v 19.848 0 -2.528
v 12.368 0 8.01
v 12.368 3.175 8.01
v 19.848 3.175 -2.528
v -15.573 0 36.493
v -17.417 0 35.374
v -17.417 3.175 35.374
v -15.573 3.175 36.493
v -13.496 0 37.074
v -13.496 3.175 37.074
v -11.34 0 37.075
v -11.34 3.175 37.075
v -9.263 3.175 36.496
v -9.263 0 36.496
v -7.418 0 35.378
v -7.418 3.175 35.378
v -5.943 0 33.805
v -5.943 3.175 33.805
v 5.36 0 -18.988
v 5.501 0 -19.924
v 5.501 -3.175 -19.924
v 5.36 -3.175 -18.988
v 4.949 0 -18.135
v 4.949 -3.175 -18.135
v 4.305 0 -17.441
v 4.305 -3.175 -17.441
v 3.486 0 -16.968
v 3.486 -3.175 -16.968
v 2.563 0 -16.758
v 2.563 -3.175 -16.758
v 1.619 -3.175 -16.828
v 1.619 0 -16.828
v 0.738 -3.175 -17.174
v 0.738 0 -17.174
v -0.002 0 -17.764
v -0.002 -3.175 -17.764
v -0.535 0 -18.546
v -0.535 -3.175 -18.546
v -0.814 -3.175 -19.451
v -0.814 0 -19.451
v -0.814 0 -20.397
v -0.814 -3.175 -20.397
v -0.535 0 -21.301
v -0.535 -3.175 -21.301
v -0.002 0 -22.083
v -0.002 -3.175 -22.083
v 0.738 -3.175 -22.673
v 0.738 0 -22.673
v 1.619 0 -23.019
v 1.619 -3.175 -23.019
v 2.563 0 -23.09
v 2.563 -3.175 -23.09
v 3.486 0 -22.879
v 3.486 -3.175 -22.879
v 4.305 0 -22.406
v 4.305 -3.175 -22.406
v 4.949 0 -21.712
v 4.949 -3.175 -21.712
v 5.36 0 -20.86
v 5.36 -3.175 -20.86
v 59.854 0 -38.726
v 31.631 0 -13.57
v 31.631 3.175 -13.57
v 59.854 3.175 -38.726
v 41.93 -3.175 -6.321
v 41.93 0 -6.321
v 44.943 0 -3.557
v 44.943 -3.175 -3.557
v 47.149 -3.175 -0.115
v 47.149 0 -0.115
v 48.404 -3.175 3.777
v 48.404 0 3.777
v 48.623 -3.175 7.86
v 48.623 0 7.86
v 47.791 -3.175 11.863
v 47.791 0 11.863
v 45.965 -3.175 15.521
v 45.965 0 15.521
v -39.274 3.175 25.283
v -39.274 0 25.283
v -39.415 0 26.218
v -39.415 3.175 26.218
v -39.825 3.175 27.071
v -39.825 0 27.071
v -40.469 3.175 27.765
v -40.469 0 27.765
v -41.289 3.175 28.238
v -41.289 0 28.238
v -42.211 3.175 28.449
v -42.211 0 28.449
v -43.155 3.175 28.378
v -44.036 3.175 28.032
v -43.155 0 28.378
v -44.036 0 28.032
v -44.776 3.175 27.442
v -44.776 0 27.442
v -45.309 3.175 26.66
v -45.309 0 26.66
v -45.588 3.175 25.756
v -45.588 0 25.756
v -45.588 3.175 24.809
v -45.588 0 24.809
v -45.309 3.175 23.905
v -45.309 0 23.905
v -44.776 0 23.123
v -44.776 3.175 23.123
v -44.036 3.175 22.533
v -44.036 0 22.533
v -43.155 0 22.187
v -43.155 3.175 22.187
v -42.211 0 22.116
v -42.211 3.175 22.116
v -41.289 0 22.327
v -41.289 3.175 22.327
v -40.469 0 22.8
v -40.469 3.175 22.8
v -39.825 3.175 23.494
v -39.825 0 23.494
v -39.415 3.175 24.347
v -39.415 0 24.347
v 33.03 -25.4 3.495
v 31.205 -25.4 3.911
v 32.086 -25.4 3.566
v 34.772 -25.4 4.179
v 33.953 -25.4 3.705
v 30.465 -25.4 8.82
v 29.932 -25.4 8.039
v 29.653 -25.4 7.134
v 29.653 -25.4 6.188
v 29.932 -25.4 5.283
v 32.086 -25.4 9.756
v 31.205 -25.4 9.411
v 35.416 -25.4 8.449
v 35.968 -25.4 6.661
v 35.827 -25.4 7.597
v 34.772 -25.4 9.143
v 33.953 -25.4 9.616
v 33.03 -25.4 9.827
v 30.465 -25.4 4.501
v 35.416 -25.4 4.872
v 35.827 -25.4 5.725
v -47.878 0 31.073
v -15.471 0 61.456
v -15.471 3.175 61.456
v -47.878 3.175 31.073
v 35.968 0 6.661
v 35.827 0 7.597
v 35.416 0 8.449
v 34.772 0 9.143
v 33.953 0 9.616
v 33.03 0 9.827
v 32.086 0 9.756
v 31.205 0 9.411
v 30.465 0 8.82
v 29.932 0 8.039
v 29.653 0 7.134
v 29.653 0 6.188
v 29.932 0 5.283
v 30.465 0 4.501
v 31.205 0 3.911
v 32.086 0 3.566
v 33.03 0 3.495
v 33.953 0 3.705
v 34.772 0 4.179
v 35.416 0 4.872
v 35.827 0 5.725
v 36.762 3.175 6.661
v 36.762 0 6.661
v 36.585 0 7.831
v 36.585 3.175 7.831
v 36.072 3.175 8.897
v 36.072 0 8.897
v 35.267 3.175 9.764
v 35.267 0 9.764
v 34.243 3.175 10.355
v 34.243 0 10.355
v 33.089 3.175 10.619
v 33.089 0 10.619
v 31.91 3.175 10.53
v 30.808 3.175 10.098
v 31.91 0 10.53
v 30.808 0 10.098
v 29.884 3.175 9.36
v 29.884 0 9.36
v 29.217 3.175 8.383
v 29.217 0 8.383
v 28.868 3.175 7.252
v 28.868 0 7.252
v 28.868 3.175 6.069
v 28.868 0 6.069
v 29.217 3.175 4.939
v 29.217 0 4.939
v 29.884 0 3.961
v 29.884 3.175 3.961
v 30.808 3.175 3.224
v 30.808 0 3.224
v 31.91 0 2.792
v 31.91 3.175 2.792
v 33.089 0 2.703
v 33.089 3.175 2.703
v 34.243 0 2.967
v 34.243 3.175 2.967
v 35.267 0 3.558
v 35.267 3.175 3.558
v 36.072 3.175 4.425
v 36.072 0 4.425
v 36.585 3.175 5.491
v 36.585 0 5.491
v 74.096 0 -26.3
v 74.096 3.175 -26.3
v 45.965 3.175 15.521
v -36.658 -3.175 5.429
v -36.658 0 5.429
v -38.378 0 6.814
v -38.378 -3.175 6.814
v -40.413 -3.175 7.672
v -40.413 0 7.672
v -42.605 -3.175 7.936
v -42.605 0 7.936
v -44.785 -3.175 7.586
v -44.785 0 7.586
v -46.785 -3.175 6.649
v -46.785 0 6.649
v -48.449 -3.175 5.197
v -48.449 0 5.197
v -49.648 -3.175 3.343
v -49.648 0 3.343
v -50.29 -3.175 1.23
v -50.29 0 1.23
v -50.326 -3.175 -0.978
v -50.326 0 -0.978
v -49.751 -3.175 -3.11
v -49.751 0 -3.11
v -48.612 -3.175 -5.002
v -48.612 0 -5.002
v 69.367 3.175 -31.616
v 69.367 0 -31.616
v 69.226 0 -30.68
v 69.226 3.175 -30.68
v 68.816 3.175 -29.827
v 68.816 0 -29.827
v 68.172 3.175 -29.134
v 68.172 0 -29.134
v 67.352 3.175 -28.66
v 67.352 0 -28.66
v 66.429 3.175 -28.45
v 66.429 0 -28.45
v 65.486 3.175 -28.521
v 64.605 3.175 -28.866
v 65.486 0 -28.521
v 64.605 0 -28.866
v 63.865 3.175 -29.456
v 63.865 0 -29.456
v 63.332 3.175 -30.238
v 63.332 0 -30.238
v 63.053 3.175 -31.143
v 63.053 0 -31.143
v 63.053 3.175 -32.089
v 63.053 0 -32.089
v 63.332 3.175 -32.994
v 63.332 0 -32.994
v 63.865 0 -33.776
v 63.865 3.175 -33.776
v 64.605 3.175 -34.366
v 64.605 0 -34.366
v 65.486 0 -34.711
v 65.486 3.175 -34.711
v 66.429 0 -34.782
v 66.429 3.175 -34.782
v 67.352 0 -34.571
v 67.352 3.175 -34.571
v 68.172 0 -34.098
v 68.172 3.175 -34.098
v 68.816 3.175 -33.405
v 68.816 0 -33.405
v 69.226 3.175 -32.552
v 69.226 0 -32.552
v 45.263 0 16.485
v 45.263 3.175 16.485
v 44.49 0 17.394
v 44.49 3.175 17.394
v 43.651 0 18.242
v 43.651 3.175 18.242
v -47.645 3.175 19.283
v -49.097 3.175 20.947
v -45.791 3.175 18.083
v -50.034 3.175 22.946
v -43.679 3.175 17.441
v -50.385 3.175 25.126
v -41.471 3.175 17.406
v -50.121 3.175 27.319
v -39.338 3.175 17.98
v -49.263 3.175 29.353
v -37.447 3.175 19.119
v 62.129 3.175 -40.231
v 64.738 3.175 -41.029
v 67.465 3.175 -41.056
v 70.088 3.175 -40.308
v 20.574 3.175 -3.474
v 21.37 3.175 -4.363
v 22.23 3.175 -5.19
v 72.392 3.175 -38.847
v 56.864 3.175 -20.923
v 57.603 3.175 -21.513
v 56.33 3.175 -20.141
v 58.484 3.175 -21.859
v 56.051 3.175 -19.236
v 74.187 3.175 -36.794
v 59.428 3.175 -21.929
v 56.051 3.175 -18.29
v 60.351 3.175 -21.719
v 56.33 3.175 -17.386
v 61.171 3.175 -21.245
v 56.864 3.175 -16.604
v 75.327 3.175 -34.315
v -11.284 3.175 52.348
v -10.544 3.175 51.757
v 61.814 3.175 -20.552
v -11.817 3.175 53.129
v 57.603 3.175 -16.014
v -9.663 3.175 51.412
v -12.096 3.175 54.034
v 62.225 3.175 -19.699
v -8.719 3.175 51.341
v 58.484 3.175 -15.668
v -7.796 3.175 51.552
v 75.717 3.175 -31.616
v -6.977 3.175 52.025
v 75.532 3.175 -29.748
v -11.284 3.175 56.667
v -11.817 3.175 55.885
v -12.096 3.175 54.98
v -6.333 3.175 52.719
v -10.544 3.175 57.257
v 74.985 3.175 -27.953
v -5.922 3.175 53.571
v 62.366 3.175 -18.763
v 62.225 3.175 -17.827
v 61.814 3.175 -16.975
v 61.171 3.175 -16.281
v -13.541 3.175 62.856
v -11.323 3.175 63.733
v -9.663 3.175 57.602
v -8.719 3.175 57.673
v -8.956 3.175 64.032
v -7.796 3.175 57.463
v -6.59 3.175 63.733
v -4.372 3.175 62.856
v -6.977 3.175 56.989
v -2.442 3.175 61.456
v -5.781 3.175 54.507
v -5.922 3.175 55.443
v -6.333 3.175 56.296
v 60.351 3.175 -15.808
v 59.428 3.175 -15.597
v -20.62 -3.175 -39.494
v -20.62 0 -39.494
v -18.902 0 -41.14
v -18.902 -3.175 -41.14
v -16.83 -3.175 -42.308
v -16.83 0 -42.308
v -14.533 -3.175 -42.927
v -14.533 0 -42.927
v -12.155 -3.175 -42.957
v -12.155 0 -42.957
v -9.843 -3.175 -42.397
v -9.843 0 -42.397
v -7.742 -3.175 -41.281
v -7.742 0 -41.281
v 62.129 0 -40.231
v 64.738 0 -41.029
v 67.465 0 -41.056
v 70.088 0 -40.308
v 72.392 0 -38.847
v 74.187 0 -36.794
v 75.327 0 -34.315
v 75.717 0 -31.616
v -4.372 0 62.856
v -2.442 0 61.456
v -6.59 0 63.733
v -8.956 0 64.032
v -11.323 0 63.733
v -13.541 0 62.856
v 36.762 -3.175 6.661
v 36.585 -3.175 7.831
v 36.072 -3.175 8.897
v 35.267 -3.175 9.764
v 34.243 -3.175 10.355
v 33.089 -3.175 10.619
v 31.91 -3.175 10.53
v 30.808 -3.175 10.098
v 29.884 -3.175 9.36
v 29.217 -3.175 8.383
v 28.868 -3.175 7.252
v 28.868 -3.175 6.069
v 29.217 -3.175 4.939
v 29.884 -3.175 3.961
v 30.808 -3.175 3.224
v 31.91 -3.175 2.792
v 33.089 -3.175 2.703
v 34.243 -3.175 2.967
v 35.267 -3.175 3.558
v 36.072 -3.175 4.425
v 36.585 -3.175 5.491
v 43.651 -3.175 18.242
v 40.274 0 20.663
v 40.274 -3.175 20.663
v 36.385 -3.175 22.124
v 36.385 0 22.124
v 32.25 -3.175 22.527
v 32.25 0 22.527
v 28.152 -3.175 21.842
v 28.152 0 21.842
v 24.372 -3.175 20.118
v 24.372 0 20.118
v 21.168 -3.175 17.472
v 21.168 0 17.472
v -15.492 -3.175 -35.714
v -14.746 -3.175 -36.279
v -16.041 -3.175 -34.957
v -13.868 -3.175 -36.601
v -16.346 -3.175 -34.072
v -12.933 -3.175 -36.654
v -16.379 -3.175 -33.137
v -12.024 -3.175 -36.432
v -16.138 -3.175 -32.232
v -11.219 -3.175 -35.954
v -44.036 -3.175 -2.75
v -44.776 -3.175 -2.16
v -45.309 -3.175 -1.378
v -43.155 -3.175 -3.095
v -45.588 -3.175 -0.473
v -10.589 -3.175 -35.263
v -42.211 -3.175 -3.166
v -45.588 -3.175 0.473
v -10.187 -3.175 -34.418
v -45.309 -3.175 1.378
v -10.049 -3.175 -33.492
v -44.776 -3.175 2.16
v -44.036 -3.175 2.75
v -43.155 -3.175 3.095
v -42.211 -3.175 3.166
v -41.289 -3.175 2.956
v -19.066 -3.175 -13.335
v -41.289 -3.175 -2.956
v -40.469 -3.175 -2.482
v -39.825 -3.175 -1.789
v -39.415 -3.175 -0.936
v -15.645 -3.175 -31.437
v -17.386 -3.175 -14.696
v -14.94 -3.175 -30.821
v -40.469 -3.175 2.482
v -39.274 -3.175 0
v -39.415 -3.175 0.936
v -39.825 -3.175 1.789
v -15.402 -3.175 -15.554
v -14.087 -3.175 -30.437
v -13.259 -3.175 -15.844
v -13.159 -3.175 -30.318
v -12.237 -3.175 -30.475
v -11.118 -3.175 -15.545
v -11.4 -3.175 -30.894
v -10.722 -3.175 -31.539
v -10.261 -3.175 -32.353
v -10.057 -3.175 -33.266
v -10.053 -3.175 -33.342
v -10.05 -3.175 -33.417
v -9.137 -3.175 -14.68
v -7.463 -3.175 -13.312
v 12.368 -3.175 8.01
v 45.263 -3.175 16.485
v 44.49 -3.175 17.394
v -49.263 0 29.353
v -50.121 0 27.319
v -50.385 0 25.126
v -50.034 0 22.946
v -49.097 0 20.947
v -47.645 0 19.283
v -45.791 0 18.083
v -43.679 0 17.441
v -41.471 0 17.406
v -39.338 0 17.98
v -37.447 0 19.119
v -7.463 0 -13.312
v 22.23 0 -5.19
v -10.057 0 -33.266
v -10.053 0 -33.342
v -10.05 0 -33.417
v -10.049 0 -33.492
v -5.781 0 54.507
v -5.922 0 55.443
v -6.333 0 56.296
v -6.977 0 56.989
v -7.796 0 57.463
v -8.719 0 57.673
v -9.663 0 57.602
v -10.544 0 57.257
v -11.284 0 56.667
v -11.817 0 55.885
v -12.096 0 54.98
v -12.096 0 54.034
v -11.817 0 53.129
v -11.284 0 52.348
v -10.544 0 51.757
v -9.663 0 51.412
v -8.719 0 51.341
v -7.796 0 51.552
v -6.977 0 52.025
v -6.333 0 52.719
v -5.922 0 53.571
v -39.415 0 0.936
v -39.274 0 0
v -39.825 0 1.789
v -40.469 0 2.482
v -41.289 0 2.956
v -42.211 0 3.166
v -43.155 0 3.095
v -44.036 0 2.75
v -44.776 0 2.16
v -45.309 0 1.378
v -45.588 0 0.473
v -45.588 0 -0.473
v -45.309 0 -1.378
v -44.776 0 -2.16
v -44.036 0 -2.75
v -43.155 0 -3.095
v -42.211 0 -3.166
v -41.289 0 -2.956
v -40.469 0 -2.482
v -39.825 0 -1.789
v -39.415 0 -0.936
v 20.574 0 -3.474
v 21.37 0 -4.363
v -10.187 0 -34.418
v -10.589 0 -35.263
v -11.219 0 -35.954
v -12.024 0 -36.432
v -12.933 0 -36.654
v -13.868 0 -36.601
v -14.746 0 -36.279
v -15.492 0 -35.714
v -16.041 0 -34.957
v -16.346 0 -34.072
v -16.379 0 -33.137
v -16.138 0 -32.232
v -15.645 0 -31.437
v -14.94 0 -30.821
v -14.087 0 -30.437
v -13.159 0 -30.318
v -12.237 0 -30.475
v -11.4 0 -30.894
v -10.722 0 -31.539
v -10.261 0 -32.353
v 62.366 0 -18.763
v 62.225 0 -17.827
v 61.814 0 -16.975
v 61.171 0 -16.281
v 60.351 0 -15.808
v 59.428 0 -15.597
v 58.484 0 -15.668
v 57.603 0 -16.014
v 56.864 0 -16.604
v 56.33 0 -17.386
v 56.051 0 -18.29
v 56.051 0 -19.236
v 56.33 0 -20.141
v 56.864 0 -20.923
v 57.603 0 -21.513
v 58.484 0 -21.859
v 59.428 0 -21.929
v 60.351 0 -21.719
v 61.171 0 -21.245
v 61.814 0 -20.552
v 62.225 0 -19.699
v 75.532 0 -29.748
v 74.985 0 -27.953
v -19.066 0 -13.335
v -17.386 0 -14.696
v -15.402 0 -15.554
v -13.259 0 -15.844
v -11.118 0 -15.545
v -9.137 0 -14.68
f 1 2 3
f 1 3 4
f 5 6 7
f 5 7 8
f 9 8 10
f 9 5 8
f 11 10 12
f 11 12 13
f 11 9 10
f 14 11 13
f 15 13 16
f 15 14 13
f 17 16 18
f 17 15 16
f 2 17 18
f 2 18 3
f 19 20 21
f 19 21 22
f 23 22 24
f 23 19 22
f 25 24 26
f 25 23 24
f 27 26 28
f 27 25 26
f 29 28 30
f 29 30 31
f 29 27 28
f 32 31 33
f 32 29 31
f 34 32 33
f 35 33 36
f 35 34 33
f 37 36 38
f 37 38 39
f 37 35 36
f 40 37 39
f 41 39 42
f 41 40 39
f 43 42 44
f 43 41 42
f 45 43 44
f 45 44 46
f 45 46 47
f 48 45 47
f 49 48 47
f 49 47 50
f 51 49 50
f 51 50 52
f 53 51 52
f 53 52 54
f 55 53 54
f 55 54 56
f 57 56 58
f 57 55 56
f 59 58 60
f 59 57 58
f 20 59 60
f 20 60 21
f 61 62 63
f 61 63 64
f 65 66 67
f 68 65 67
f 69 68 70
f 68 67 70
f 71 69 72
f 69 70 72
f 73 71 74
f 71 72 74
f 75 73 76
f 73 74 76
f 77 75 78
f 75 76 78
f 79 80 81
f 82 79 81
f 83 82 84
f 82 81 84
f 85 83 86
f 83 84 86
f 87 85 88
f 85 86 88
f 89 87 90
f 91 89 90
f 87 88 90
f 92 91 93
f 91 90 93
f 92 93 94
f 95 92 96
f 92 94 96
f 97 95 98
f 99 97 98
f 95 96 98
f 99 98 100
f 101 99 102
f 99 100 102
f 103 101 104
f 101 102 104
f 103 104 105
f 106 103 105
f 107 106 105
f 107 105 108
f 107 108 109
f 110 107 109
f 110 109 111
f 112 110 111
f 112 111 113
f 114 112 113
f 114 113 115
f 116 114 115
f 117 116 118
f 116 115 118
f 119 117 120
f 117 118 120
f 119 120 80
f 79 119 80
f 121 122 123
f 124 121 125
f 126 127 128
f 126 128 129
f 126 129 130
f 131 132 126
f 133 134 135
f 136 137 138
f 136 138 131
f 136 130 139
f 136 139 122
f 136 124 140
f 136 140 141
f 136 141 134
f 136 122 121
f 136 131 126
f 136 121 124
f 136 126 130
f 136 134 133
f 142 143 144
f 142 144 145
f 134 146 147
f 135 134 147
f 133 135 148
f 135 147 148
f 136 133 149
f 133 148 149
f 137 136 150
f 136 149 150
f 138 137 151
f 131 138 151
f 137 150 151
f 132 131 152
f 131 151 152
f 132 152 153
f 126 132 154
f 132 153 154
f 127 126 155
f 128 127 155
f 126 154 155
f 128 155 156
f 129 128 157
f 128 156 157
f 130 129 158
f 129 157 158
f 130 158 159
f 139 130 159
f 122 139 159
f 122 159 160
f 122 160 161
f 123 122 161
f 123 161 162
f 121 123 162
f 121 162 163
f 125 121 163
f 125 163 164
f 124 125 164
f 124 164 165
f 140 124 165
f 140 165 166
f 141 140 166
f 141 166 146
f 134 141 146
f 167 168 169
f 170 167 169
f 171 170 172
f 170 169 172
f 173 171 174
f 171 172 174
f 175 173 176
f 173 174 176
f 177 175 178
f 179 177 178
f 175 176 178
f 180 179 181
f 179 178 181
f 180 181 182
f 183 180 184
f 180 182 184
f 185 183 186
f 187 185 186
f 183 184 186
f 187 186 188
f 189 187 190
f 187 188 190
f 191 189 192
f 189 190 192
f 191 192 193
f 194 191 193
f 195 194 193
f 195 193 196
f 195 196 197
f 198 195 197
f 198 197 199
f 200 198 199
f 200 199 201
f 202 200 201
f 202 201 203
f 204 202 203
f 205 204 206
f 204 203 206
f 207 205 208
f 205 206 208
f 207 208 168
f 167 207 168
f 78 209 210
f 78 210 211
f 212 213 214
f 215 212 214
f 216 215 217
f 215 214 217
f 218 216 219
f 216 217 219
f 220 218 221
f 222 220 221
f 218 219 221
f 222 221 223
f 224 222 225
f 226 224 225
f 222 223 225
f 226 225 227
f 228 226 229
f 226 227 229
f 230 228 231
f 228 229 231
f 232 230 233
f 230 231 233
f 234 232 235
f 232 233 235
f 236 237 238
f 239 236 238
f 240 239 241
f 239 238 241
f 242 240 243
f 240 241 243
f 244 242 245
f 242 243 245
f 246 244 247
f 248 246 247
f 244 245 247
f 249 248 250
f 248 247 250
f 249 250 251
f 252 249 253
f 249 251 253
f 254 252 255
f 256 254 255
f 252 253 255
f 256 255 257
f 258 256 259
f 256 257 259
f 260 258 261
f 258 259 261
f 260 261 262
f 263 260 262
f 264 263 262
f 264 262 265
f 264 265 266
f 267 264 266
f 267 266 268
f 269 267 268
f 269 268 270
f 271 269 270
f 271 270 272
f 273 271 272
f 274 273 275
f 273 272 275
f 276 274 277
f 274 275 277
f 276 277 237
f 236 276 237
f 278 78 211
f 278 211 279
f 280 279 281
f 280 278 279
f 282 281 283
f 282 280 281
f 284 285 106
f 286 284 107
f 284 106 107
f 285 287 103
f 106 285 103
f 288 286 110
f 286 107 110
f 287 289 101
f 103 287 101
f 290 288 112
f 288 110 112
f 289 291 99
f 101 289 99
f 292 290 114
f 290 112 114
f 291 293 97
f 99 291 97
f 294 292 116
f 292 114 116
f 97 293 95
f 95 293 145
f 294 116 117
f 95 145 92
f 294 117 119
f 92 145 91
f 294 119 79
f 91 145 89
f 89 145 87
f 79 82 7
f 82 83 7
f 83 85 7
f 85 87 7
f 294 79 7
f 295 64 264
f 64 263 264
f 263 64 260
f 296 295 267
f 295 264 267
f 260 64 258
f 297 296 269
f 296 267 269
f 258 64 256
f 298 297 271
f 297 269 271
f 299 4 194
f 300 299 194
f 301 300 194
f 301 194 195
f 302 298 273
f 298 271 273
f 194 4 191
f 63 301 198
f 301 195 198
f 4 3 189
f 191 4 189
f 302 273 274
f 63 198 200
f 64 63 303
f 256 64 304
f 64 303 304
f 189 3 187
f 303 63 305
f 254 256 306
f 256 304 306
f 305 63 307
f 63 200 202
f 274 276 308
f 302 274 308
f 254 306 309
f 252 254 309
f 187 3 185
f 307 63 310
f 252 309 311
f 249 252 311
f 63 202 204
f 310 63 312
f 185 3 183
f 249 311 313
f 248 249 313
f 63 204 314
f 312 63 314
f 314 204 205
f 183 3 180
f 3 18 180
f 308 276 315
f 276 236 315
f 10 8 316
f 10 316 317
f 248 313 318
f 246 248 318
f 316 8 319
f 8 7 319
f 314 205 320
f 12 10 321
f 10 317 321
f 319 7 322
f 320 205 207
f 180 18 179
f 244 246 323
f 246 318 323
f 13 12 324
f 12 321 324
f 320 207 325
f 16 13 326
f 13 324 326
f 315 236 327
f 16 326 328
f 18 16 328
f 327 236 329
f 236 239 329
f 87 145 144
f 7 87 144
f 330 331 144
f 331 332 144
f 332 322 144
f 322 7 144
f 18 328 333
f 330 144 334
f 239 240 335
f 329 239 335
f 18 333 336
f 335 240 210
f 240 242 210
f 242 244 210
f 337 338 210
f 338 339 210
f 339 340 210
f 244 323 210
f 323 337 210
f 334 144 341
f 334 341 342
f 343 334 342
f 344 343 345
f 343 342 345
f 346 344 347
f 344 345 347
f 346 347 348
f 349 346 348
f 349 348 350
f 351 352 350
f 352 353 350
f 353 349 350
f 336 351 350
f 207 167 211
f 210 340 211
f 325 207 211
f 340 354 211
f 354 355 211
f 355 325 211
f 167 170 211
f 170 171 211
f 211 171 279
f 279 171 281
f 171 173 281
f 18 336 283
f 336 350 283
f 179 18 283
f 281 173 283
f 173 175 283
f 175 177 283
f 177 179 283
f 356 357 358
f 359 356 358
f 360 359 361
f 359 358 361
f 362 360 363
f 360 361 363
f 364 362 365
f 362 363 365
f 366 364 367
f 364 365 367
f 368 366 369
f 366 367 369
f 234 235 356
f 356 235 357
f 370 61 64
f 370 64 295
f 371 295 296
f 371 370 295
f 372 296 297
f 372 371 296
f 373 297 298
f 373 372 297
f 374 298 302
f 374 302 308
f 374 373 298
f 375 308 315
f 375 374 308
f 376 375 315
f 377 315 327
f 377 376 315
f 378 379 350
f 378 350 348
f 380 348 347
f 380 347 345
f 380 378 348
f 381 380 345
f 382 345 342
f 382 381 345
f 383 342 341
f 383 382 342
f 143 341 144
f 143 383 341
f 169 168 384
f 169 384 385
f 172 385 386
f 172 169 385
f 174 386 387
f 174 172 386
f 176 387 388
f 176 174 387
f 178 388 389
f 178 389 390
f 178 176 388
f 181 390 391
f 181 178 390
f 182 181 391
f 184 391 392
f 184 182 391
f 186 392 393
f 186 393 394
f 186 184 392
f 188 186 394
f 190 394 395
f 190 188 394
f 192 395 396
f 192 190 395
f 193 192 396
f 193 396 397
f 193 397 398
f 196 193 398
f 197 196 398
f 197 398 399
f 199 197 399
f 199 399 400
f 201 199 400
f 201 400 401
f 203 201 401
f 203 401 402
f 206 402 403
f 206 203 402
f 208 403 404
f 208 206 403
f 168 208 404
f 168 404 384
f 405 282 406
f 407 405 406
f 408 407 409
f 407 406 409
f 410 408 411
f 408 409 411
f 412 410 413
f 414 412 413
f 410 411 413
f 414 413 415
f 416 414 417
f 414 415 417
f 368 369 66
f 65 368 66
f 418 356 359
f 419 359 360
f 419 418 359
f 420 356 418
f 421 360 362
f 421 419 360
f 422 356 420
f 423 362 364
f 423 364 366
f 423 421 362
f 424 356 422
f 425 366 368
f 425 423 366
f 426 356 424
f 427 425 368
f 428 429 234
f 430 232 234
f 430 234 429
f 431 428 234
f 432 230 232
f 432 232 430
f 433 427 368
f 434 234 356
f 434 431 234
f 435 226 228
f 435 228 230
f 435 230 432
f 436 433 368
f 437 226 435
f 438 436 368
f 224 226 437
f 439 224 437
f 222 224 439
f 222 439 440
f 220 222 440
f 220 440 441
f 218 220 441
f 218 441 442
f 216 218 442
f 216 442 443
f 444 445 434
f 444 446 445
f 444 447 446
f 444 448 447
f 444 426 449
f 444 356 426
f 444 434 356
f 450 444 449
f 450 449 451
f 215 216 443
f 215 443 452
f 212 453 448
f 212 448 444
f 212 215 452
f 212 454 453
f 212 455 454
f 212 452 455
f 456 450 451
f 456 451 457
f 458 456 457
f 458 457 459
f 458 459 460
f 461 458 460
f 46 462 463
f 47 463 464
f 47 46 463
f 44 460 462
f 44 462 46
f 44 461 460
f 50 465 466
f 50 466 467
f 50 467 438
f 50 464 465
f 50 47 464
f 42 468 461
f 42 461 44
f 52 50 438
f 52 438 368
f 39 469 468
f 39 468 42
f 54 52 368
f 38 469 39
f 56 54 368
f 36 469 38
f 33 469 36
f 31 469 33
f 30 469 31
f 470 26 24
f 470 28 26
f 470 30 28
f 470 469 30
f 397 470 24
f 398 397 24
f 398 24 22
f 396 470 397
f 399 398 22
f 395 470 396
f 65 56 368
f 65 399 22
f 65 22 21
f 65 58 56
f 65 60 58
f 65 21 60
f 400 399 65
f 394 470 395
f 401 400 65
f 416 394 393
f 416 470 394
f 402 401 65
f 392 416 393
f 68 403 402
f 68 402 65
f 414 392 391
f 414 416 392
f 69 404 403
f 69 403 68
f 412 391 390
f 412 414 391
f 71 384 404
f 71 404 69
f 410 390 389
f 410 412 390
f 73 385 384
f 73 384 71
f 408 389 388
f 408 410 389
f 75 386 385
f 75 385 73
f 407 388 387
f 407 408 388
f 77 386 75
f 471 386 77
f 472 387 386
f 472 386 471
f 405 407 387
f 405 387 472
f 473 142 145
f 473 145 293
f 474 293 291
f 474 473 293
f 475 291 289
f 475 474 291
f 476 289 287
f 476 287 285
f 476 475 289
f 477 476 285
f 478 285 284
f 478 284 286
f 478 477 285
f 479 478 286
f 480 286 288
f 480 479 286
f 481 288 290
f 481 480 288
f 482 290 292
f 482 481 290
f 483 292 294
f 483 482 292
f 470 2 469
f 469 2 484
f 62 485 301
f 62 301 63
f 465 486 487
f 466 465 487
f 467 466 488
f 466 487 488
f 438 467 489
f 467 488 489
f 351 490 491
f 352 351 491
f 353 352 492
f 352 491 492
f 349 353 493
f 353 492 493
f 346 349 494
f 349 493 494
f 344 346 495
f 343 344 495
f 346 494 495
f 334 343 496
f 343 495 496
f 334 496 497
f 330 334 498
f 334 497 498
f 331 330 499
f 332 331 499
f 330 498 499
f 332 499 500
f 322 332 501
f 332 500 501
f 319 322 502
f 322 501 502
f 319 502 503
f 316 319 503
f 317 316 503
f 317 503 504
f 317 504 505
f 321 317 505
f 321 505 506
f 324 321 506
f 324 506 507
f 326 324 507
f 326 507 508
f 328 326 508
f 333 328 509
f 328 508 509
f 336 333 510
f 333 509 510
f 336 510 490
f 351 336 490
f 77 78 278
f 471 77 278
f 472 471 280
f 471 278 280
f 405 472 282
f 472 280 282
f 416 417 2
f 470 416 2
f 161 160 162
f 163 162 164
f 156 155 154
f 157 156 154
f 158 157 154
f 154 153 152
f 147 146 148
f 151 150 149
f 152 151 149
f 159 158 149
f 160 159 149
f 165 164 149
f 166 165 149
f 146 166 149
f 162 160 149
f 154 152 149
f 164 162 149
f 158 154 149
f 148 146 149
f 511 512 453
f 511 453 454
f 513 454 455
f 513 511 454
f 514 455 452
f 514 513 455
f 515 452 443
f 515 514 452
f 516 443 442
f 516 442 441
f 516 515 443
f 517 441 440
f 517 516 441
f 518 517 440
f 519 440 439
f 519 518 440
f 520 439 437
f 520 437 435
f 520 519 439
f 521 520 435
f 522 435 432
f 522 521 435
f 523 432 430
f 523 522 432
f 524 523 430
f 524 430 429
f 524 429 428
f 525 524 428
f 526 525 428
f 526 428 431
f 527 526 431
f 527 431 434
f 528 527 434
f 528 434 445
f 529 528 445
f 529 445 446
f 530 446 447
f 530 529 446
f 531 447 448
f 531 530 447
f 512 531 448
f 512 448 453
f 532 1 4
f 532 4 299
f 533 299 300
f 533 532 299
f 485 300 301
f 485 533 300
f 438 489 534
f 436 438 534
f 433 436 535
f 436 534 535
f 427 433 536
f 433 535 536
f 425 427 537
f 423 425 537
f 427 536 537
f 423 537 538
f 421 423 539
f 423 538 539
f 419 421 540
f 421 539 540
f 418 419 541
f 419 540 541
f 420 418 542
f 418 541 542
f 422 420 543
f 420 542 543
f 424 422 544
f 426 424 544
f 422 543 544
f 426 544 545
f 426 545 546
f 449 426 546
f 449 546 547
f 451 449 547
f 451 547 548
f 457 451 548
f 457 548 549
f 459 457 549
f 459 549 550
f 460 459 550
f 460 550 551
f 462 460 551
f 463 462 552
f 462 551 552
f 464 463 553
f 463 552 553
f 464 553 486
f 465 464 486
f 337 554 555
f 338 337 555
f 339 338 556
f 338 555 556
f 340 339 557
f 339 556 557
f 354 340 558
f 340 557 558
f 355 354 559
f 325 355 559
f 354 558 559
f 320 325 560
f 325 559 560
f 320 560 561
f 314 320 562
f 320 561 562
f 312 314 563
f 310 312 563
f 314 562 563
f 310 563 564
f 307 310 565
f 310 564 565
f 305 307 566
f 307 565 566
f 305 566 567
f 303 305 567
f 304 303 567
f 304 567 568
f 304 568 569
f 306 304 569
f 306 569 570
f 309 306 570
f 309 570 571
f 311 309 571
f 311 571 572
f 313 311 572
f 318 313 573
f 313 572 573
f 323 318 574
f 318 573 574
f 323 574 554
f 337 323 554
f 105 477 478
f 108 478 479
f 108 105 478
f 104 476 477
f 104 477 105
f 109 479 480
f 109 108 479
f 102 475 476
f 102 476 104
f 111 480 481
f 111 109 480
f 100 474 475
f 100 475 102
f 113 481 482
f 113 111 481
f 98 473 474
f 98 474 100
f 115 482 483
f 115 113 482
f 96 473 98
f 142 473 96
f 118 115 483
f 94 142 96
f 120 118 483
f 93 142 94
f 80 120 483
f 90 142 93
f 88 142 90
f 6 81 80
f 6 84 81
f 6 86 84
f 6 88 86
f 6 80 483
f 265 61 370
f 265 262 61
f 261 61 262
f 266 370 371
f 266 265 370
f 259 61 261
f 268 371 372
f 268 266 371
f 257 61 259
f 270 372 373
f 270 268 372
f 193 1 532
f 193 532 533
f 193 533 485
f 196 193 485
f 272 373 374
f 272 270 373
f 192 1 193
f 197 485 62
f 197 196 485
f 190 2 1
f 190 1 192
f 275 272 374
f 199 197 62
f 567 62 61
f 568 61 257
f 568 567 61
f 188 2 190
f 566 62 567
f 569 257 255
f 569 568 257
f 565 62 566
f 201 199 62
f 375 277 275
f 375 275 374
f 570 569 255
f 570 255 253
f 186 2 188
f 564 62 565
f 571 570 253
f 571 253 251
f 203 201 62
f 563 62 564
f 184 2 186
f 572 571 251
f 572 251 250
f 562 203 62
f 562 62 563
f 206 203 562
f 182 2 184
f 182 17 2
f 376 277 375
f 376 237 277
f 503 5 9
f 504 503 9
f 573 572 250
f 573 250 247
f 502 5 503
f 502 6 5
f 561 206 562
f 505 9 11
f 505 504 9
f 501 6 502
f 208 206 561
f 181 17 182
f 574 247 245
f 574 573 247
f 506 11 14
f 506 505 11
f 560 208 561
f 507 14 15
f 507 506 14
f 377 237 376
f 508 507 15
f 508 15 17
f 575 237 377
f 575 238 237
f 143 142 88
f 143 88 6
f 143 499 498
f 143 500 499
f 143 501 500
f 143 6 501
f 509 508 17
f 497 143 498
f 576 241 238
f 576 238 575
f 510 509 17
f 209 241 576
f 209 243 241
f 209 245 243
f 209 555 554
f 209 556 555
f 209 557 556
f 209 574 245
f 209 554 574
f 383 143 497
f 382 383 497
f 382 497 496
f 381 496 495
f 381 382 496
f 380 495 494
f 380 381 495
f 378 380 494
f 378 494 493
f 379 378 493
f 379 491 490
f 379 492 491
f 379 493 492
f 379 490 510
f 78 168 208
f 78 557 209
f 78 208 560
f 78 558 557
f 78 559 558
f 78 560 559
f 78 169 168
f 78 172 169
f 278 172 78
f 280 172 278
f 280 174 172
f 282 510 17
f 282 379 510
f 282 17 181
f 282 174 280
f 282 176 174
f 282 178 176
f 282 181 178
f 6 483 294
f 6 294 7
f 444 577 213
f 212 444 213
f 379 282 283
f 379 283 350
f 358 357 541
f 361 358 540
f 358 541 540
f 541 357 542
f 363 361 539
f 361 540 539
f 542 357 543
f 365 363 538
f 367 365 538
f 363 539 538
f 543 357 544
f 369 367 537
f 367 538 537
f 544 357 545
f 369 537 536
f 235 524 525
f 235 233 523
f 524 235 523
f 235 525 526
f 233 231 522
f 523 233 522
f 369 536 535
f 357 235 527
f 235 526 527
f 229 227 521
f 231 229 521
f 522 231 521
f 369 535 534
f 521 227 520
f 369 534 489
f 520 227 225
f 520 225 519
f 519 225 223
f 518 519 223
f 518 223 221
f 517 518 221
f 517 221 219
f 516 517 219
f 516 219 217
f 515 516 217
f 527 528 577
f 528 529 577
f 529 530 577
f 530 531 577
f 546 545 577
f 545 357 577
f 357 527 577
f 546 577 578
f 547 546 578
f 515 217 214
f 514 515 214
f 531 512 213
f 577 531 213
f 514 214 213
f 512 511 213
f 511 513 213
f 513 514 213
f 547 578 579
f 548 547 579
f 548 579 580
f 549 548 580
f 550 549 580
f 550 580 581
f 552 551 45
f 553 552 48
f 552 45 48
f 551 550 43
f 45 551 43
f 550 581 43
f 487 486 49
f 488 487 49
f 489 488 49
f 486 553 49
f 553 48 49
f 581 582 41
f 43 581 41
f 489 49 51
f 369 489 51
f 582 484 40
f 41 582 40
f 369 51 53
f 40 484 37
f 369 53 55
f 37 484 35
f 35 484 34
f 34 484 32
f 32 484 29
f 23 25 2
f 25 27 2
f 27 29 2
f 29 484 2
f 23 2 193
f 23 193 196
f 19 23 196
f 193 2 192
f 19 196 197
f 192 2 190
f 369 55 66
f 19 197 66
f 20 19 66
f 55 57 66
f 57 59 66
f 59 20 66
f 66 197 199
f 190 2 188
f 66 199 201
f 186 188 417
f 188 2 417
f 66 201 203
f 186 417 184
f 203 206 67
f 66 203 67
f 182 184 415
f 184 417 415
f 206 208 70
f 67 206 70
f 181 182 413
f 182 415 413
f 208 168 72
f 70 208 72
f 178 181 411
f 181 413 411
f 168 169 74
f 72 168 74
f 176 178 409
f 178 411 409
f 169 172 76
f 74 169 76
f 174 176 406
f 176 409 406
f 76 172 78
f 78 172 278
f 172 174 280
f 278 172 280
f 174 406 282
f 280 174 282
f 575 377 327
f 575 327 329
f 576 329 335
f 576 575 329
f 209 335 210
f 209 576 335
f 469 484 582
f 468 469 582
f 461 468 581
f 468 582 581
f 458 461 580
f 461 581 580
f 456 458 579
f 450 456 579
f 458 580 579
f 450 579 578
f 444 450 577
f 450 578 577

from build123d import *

# Parameters (mm, degrees)
F0_R     = 3.175
F0_R_2   = 3.96875
F1_DEPTH = 3.175
F2_DEPTH = 3.175
F3_DEPTH = 25.4


# Not quite as in the source:
# - a feature names something its author has since deleted; it is built from what else it names


with BuildPart() as f1:
    # F0 (on Front) → F1 (new body)
    with BuildSketch(Plane.XZ):
        with BuildLine():
            ThreePointArc((21.168407994, 17.4724150988), (32.2496948497, 22.5266363925), (43.6506851161, 18.2420719796))
            Line((43.6506851161, 18.2420719796), (-2.4416753004, 61.4557481855))
            ThreePointArc((-2.4416753004, 61.4557481855), (-0.2162960867, 58.2934233078), (0.5686178911, 54.5070634035))
            ThreePointArc((0.5686178911, 54.5070634035), (-12.7427420132, 45.7669773813), (-15.4710889174, 61.4557481855))
            Line((-15.4710889174, 61.4557481855), (-47.8775973584, 31.0731782742))
            ThreePointArc((-47.8775973584, 31.0731782742), (-39.2933750978, 32.5660126411), (-34.511175018, 25.2826076226))
            ThreePointArc((-34.511175018, 25.2826076226), (-35.2826057932, 21.8691990453), (-37.4469502912, 19.1192760553))
            Line((-37.4469502912, 19.1192760553), (-17.4168982381, 35.3742520435))
            ThreePointArc((-17.4168982381, 35.3742520435), (-11.3398687202, 37.0752466303), (-5.9425206073, 33.8053378098))
            Line((-5.9425206073, 33.8053378098), (12.3676167081, 8.0098658563))
            Line((12.3676167081, 8.0098658563), (21.168407994, 17.4724150988))
        make_face()
        with BuildLine():
            ThreePointArc((0.5686178911, 54.5070634035), (-0.2162960867, 58.2934233078), (-2.4416753004, 61.4557481855))
            ThreePointArc((-2.4416753004, 61.4557481855), (-8.9563821089, 64.0320634035), (-15.4710889174, 61.4557481855))
            ThreePointArc((-15.4710889174, 61.4557481855), (-12.7427420132, 45.7669773813), (0.5686178911, 54.5070634035))
        make_face()
        with Locations((-8.9563821089, 54.5070634035)):
            Circle(F0_R, mode=Mode.SUBTRACT)
        with BuildLine():
            ThreePointArc((-34.511175018, 25.2826076226), (-39.2933750978, 32.5660126411), (-47.8775973584, 31.0731782742))
            ThreePointArc((-47.8775973584, 31.0731782742), (-48.4294416089, 20.0639548045), (-37.4469502912, 19.1192760553))
            ThreePointArc((-37.4469502912, 19.1192760553), (-35.2826057932, 21.8691990453), (-34.511175018, 25.2826076226))
        make_face()
        with Locations((-42.448675018, 25.2826076226)):
            Circle(F0_R, mode=Mode.SUBTRACT)
        with BuildLine():
            ThreePointArc((48.6678404353, 6.6609306763), (47.9771603326, 11.292566916), (45.9652194266, 15.52118218))
            ThreePointArc((45.9652194266, 15.52118218), (44.8847270854, 16.9469358407), (43.6506851161, 18.2420719796))
            ThreePointArc((43.6506851161, 18.2420719796), (32.2496948497, 22.5266363925), (21.168407994, 17.4724150988))
            ThreePointArc((21.168407994, 17.4724150988), (16.9523480083, 7.7070782137), (19.8475346273, -2.5279039906))
            ThreePointArc((19.8475346273, -2.5279039906), (20.9635537477, -3.926023629), (22.229787853, -5.1897041229))
            ThreePointArc((22.229787853, -5.1897041229), (31.8827140076, -9.1879587134), (41.9298775136, -6.3209866871))
            ThreePointArc((41.9298775136, -6.3209866871), (46.8830158887, -0.6522478865), (48.6678404353, 6.6609306763))
        make_face()
        with Locations((32.7928404353, 6.6609306763)):
            Circle(F0_R_2, mode=Mode.SUBTRACT)
        with BuildLine():
            ThreePointArc((59.8543869213, -38.726356385), (59.9298350891, -24.4390555964), (74.0956458655, -26.2998246032))
            Line((74.0956458655, -26.2998246032), (45.9652194266, 15.52118218))
            ThreePointArc((45.9652194266, 15.52118218), (47.9771603326, 11.292566916), (48.6678404353, 6.6609306763))
            ThreePointArc((48.6678404353, 6.6609306763), (46.8830158887, -0.6522478865), (41.9298775136, -6.3209866871))
            Line((41.9298775136, -6.3209866871), (31.63109975, -13.5695549573))
            Line((31.63109975, -13.5695549573), (59.8543869213, -38.726356385))
        make_face()
        with Locations((59.1909500346, -18.7631345147)):
            Circle(F0_R, mode=Mode.SUBTRACT)
        with BuildLine():
            Line((22.229787853, -5.1897041229), (31.63109975, -13.5695549573))
            Line((31.63109975, -13.5695549573), (41.9298775136, -6.3209866871))
            ThreePointArc((41.9298775136, -6.3209866871), (31.8827140076, -9.1879587134), (22.229787853, -5.1897041229))
        make_face()
        with BuildLine():
            ThreePointArc((19.8475346273, -2.5279039906), (16.9523480083, 7.7070782137), (21.168407994, 17.4724150988))
            Line((21.168407994, 17.4724150988), (12.3676167081, 8.0098658563))
            Line((12.3676167081, 8.0098658563), (19.8475346273, -2.5279039906))
        make_face()
        with BuildLine():
            ThreePointArc((59.8543869213, -38.726356385), (70.088227935, -40.3077379996), (75.7172184707, -31.6159755055))
            ThreePointArc((75.7172184707, -31.6159755055), (75.3028104091, -28.8369937617), (74.0956458655, -26.2998246032))
            ThreePointArc((74.0956458655, -26.2998246032), (59.9298350891, -24.4390555964), (59.8543869213, -38.726356385))
        make_face()
        with Locations((66.1922184707, -31.6159755055)):
            Circle(F0_R, mode=Mode.SUBTRACT)
    extrude(amount=-F1_DEPTH)


with BuildPart() as f2:
    # F0 (on Front) → F2 (new body)
    with BuildSketch(Plane.XZ):
        with Locations((32.7928404353, 6.6609306763)):
            Circle(F0_R)
    extrude(amount=F2_DEPTH)

    # F0 (on Front) → F3 (join)
    with BuildSketch(Plane.XZ):
        with Locations((32.7928404353, 6.6609306763)):
            Circle(F0_R)
    extrude(amount=F3_DEPTH)


with BuildPart() as f2b:
    # F0 (on Front) → F2, piece 2 (new body)
    with BuildSketch(Plane.XZ):
        with BuildLine():
            ThreePointArc((48.6678404353, 6.6609306763), (47.9771603326, 11.292566916), (45.9652194266, 15.52118218))
            ThreePointArc((45.9652194266, 15.52118218), (44.8847270854, 16.9469358407), (43.6506851161, 18.2420719796))
            ThreePointArc((43.6506851161, 18.2420719796), (32.2496948497, 22.5266363925), (21.168407994, 17.4724150988))
            ThreePointArc((21.168407994, 17.4724150988), (16.9523480083, 7.7070782137), (19.8475346273, -2.5279039906))
            ThreePointArc((19.8475346273, -2.5279039906), (20.9635537477, -3.926023629), (22.229787853, -5.1897041229))
            ThreePointArc((22.229787853, -5.1897041229), (31.8827140076, -9.1879587134), (41.9298775136, -6.3209866871))
            ThreePointArc((41.9298775136, -6.3209866871), (46.8830158887, -0.6522478865), (48.6678404353, 6.6609306763))
        make_face()
        with Locations((32.7928404353, 6.6609306763)):
            Circle(F0_R_2, mode=Mode.SUBTRACT)
        with BuildLine():
            Line((-7.7419969901, -41.2814433271), (31.63109975, -13.5695549573))
            Line((31.63109975, -13.5695549573), (22.229787853, -5.1897041229))
            ThreePointArc((22.229787853, -5.1897041229), (20.9635537477, -3.926023629), (19.8475346273, -2.5279039906))
            Line((19.8475346273, -2.5279039906), (12.3676167081, 8.0098658563))
            Line((12.3676167081, 8.0098658563), (-7.4631189723, -13.3120024615))
            ThreePointArc((-7.4631189723, -13.3120024615), (-13.2594776313, -15.8437444101), (-19.0659058445, -13.3351825907))
            Line((-19.0659058445, -13.3351825907), (-36.6581043663, 5.4289223404))
            ThreePointArc((-36.6581043663, 5.4289223404), (-35.067395969, 2.9190111085), (-34.511175018, 0))
            ThreePointArc((-34.511175018, 0), (-39.7951432267, -7.4808204953), (-48.6120065852, -5.0017247268))
            Line((-48.6120065852, -5.0017247268), (-20.6202171177, -39.4943625812))
            ThreePointArc((-20.6202171177, -39.4943625812), (-20.0372197924, -26.8358187348), (-7.3956423811, -25.9588131796))
            ThreePointArc((-7.3956423811, -25.9588131796), (-4.6731134737, -29.2965551642), (-3.699219237, -33.4922929091))
            ThreePointArc((-3.699219237, -33.4922929091), (-4.3961637904, -37.0687523357), (-6.3850065401, -40.1218324621))
            ThreePointArc((-6.3850065401, -40.1218324621), (-7.0362782136, -40.7334952188), (-7.7419969901, -41.2814433271))
        make_face()
        with Locations((2.3257738993, -19.9237955822)):
            Circle(F0_R, mode=Mode.SUBTRACT)
        with BuildLine():
            Line((22.229787853, -5.1897041229), (31.63109975, -13.5695549573))
            Line((31.63109975, -13.5695549573), (41.9298775136, -6.3209866871))
            ThreePointArc((41.9298775136, -6.3209866871), (31.8827140076, -9.1879587134), (22.229787853, -5.1897041229))
        make_face()
        with BuildLine():
            ThreePointArc((-20.6202171177, -39.4943625812), (-14.533436061, -42.9268875643), (-7.7419969901, -41.2814433271))
            ThreePointArc((-7.7419969901, -41.2814433271), (-7.0362782136, -40.7334952188), (-6.3850065401, -40.1218324621))
            Line((-6.3850065401, -40.1218324621), (-6.8903244606, -33.0403228209))
            Line((-6.8903244606, -33.0403228209), (-7.3956423811, -25.9588131796))
            ThreePointArc((-7.3956423811, -25.9588131796), (-20.0372197924, -26.8358187348), (-20.6202171177, -39.4943625812))
        make_face()
        with BuildLine():
            ThreePointArc((-10.049219237, -33.4922929091), (-16.3972054455, -33.6053571438), (-10.0572718488, -33.266307865))
            ThreePointArc((-10.0572718488, -33.266307865), (-10.0512330286, -33.3792286743), (-10.049219237, -33.4922929091))
        make_face(mode=Mode.SUBTRACT)
        with BuildLine():
            ThreePointArc((19.8475346273, -2.5279039906), (16.9523480083, 7.7070782137), (21.168407994, 17.4724150988))
            Line((21.168407994, 17.4724150988), (12.3676167081, 8.0098658563))
            Line((12.3676167081, 8.0098658563), (19.8475346273, -2.5279039906))
        make_face()
        with BuildLine():
            Line((-6.8903244606, -33.0403228209), (-6.3850065401, -40.1218324621))
            ThreePointArc((-6.3850065401, -40.1218324621), (-4.3961637904, -37.0687523357), (-3.699219237, -33.4922929091))
            ThreePointArc((-3.699219237, -33.4922929091), (-4.6731134737, -29.2965551642), (-7.3956423811, -25.9588131796))
            Line((-7.3956423811, -25.9588131796), (-6.8903244606, -33.0403228209))
        make_face()
        with BuildLine():
            ThreePointArc((-36.6581043663, 5.4289223404), (-47.667327836, 5.9807665909), (-48.6120065852, -5.0017247268))
            ThreePointArc((-48.6120065852, -5.0017247268), (-39.7951432267, -7.4808204953), (-34.511175018, 0))
            ThreePointArc((-34.511175018, 0), (-35.067395969, 2.9190111085), (-36.6581043663, 5.4289223404))
        make_face()
        with Locations((-42.448675018, 0)):
            Circle(F0_R, mode=Mode.SUBTRACT)
    extrude(amount=F2_DEPTH)


solid = Compound([f1.part, f2.part, f2b.part])
